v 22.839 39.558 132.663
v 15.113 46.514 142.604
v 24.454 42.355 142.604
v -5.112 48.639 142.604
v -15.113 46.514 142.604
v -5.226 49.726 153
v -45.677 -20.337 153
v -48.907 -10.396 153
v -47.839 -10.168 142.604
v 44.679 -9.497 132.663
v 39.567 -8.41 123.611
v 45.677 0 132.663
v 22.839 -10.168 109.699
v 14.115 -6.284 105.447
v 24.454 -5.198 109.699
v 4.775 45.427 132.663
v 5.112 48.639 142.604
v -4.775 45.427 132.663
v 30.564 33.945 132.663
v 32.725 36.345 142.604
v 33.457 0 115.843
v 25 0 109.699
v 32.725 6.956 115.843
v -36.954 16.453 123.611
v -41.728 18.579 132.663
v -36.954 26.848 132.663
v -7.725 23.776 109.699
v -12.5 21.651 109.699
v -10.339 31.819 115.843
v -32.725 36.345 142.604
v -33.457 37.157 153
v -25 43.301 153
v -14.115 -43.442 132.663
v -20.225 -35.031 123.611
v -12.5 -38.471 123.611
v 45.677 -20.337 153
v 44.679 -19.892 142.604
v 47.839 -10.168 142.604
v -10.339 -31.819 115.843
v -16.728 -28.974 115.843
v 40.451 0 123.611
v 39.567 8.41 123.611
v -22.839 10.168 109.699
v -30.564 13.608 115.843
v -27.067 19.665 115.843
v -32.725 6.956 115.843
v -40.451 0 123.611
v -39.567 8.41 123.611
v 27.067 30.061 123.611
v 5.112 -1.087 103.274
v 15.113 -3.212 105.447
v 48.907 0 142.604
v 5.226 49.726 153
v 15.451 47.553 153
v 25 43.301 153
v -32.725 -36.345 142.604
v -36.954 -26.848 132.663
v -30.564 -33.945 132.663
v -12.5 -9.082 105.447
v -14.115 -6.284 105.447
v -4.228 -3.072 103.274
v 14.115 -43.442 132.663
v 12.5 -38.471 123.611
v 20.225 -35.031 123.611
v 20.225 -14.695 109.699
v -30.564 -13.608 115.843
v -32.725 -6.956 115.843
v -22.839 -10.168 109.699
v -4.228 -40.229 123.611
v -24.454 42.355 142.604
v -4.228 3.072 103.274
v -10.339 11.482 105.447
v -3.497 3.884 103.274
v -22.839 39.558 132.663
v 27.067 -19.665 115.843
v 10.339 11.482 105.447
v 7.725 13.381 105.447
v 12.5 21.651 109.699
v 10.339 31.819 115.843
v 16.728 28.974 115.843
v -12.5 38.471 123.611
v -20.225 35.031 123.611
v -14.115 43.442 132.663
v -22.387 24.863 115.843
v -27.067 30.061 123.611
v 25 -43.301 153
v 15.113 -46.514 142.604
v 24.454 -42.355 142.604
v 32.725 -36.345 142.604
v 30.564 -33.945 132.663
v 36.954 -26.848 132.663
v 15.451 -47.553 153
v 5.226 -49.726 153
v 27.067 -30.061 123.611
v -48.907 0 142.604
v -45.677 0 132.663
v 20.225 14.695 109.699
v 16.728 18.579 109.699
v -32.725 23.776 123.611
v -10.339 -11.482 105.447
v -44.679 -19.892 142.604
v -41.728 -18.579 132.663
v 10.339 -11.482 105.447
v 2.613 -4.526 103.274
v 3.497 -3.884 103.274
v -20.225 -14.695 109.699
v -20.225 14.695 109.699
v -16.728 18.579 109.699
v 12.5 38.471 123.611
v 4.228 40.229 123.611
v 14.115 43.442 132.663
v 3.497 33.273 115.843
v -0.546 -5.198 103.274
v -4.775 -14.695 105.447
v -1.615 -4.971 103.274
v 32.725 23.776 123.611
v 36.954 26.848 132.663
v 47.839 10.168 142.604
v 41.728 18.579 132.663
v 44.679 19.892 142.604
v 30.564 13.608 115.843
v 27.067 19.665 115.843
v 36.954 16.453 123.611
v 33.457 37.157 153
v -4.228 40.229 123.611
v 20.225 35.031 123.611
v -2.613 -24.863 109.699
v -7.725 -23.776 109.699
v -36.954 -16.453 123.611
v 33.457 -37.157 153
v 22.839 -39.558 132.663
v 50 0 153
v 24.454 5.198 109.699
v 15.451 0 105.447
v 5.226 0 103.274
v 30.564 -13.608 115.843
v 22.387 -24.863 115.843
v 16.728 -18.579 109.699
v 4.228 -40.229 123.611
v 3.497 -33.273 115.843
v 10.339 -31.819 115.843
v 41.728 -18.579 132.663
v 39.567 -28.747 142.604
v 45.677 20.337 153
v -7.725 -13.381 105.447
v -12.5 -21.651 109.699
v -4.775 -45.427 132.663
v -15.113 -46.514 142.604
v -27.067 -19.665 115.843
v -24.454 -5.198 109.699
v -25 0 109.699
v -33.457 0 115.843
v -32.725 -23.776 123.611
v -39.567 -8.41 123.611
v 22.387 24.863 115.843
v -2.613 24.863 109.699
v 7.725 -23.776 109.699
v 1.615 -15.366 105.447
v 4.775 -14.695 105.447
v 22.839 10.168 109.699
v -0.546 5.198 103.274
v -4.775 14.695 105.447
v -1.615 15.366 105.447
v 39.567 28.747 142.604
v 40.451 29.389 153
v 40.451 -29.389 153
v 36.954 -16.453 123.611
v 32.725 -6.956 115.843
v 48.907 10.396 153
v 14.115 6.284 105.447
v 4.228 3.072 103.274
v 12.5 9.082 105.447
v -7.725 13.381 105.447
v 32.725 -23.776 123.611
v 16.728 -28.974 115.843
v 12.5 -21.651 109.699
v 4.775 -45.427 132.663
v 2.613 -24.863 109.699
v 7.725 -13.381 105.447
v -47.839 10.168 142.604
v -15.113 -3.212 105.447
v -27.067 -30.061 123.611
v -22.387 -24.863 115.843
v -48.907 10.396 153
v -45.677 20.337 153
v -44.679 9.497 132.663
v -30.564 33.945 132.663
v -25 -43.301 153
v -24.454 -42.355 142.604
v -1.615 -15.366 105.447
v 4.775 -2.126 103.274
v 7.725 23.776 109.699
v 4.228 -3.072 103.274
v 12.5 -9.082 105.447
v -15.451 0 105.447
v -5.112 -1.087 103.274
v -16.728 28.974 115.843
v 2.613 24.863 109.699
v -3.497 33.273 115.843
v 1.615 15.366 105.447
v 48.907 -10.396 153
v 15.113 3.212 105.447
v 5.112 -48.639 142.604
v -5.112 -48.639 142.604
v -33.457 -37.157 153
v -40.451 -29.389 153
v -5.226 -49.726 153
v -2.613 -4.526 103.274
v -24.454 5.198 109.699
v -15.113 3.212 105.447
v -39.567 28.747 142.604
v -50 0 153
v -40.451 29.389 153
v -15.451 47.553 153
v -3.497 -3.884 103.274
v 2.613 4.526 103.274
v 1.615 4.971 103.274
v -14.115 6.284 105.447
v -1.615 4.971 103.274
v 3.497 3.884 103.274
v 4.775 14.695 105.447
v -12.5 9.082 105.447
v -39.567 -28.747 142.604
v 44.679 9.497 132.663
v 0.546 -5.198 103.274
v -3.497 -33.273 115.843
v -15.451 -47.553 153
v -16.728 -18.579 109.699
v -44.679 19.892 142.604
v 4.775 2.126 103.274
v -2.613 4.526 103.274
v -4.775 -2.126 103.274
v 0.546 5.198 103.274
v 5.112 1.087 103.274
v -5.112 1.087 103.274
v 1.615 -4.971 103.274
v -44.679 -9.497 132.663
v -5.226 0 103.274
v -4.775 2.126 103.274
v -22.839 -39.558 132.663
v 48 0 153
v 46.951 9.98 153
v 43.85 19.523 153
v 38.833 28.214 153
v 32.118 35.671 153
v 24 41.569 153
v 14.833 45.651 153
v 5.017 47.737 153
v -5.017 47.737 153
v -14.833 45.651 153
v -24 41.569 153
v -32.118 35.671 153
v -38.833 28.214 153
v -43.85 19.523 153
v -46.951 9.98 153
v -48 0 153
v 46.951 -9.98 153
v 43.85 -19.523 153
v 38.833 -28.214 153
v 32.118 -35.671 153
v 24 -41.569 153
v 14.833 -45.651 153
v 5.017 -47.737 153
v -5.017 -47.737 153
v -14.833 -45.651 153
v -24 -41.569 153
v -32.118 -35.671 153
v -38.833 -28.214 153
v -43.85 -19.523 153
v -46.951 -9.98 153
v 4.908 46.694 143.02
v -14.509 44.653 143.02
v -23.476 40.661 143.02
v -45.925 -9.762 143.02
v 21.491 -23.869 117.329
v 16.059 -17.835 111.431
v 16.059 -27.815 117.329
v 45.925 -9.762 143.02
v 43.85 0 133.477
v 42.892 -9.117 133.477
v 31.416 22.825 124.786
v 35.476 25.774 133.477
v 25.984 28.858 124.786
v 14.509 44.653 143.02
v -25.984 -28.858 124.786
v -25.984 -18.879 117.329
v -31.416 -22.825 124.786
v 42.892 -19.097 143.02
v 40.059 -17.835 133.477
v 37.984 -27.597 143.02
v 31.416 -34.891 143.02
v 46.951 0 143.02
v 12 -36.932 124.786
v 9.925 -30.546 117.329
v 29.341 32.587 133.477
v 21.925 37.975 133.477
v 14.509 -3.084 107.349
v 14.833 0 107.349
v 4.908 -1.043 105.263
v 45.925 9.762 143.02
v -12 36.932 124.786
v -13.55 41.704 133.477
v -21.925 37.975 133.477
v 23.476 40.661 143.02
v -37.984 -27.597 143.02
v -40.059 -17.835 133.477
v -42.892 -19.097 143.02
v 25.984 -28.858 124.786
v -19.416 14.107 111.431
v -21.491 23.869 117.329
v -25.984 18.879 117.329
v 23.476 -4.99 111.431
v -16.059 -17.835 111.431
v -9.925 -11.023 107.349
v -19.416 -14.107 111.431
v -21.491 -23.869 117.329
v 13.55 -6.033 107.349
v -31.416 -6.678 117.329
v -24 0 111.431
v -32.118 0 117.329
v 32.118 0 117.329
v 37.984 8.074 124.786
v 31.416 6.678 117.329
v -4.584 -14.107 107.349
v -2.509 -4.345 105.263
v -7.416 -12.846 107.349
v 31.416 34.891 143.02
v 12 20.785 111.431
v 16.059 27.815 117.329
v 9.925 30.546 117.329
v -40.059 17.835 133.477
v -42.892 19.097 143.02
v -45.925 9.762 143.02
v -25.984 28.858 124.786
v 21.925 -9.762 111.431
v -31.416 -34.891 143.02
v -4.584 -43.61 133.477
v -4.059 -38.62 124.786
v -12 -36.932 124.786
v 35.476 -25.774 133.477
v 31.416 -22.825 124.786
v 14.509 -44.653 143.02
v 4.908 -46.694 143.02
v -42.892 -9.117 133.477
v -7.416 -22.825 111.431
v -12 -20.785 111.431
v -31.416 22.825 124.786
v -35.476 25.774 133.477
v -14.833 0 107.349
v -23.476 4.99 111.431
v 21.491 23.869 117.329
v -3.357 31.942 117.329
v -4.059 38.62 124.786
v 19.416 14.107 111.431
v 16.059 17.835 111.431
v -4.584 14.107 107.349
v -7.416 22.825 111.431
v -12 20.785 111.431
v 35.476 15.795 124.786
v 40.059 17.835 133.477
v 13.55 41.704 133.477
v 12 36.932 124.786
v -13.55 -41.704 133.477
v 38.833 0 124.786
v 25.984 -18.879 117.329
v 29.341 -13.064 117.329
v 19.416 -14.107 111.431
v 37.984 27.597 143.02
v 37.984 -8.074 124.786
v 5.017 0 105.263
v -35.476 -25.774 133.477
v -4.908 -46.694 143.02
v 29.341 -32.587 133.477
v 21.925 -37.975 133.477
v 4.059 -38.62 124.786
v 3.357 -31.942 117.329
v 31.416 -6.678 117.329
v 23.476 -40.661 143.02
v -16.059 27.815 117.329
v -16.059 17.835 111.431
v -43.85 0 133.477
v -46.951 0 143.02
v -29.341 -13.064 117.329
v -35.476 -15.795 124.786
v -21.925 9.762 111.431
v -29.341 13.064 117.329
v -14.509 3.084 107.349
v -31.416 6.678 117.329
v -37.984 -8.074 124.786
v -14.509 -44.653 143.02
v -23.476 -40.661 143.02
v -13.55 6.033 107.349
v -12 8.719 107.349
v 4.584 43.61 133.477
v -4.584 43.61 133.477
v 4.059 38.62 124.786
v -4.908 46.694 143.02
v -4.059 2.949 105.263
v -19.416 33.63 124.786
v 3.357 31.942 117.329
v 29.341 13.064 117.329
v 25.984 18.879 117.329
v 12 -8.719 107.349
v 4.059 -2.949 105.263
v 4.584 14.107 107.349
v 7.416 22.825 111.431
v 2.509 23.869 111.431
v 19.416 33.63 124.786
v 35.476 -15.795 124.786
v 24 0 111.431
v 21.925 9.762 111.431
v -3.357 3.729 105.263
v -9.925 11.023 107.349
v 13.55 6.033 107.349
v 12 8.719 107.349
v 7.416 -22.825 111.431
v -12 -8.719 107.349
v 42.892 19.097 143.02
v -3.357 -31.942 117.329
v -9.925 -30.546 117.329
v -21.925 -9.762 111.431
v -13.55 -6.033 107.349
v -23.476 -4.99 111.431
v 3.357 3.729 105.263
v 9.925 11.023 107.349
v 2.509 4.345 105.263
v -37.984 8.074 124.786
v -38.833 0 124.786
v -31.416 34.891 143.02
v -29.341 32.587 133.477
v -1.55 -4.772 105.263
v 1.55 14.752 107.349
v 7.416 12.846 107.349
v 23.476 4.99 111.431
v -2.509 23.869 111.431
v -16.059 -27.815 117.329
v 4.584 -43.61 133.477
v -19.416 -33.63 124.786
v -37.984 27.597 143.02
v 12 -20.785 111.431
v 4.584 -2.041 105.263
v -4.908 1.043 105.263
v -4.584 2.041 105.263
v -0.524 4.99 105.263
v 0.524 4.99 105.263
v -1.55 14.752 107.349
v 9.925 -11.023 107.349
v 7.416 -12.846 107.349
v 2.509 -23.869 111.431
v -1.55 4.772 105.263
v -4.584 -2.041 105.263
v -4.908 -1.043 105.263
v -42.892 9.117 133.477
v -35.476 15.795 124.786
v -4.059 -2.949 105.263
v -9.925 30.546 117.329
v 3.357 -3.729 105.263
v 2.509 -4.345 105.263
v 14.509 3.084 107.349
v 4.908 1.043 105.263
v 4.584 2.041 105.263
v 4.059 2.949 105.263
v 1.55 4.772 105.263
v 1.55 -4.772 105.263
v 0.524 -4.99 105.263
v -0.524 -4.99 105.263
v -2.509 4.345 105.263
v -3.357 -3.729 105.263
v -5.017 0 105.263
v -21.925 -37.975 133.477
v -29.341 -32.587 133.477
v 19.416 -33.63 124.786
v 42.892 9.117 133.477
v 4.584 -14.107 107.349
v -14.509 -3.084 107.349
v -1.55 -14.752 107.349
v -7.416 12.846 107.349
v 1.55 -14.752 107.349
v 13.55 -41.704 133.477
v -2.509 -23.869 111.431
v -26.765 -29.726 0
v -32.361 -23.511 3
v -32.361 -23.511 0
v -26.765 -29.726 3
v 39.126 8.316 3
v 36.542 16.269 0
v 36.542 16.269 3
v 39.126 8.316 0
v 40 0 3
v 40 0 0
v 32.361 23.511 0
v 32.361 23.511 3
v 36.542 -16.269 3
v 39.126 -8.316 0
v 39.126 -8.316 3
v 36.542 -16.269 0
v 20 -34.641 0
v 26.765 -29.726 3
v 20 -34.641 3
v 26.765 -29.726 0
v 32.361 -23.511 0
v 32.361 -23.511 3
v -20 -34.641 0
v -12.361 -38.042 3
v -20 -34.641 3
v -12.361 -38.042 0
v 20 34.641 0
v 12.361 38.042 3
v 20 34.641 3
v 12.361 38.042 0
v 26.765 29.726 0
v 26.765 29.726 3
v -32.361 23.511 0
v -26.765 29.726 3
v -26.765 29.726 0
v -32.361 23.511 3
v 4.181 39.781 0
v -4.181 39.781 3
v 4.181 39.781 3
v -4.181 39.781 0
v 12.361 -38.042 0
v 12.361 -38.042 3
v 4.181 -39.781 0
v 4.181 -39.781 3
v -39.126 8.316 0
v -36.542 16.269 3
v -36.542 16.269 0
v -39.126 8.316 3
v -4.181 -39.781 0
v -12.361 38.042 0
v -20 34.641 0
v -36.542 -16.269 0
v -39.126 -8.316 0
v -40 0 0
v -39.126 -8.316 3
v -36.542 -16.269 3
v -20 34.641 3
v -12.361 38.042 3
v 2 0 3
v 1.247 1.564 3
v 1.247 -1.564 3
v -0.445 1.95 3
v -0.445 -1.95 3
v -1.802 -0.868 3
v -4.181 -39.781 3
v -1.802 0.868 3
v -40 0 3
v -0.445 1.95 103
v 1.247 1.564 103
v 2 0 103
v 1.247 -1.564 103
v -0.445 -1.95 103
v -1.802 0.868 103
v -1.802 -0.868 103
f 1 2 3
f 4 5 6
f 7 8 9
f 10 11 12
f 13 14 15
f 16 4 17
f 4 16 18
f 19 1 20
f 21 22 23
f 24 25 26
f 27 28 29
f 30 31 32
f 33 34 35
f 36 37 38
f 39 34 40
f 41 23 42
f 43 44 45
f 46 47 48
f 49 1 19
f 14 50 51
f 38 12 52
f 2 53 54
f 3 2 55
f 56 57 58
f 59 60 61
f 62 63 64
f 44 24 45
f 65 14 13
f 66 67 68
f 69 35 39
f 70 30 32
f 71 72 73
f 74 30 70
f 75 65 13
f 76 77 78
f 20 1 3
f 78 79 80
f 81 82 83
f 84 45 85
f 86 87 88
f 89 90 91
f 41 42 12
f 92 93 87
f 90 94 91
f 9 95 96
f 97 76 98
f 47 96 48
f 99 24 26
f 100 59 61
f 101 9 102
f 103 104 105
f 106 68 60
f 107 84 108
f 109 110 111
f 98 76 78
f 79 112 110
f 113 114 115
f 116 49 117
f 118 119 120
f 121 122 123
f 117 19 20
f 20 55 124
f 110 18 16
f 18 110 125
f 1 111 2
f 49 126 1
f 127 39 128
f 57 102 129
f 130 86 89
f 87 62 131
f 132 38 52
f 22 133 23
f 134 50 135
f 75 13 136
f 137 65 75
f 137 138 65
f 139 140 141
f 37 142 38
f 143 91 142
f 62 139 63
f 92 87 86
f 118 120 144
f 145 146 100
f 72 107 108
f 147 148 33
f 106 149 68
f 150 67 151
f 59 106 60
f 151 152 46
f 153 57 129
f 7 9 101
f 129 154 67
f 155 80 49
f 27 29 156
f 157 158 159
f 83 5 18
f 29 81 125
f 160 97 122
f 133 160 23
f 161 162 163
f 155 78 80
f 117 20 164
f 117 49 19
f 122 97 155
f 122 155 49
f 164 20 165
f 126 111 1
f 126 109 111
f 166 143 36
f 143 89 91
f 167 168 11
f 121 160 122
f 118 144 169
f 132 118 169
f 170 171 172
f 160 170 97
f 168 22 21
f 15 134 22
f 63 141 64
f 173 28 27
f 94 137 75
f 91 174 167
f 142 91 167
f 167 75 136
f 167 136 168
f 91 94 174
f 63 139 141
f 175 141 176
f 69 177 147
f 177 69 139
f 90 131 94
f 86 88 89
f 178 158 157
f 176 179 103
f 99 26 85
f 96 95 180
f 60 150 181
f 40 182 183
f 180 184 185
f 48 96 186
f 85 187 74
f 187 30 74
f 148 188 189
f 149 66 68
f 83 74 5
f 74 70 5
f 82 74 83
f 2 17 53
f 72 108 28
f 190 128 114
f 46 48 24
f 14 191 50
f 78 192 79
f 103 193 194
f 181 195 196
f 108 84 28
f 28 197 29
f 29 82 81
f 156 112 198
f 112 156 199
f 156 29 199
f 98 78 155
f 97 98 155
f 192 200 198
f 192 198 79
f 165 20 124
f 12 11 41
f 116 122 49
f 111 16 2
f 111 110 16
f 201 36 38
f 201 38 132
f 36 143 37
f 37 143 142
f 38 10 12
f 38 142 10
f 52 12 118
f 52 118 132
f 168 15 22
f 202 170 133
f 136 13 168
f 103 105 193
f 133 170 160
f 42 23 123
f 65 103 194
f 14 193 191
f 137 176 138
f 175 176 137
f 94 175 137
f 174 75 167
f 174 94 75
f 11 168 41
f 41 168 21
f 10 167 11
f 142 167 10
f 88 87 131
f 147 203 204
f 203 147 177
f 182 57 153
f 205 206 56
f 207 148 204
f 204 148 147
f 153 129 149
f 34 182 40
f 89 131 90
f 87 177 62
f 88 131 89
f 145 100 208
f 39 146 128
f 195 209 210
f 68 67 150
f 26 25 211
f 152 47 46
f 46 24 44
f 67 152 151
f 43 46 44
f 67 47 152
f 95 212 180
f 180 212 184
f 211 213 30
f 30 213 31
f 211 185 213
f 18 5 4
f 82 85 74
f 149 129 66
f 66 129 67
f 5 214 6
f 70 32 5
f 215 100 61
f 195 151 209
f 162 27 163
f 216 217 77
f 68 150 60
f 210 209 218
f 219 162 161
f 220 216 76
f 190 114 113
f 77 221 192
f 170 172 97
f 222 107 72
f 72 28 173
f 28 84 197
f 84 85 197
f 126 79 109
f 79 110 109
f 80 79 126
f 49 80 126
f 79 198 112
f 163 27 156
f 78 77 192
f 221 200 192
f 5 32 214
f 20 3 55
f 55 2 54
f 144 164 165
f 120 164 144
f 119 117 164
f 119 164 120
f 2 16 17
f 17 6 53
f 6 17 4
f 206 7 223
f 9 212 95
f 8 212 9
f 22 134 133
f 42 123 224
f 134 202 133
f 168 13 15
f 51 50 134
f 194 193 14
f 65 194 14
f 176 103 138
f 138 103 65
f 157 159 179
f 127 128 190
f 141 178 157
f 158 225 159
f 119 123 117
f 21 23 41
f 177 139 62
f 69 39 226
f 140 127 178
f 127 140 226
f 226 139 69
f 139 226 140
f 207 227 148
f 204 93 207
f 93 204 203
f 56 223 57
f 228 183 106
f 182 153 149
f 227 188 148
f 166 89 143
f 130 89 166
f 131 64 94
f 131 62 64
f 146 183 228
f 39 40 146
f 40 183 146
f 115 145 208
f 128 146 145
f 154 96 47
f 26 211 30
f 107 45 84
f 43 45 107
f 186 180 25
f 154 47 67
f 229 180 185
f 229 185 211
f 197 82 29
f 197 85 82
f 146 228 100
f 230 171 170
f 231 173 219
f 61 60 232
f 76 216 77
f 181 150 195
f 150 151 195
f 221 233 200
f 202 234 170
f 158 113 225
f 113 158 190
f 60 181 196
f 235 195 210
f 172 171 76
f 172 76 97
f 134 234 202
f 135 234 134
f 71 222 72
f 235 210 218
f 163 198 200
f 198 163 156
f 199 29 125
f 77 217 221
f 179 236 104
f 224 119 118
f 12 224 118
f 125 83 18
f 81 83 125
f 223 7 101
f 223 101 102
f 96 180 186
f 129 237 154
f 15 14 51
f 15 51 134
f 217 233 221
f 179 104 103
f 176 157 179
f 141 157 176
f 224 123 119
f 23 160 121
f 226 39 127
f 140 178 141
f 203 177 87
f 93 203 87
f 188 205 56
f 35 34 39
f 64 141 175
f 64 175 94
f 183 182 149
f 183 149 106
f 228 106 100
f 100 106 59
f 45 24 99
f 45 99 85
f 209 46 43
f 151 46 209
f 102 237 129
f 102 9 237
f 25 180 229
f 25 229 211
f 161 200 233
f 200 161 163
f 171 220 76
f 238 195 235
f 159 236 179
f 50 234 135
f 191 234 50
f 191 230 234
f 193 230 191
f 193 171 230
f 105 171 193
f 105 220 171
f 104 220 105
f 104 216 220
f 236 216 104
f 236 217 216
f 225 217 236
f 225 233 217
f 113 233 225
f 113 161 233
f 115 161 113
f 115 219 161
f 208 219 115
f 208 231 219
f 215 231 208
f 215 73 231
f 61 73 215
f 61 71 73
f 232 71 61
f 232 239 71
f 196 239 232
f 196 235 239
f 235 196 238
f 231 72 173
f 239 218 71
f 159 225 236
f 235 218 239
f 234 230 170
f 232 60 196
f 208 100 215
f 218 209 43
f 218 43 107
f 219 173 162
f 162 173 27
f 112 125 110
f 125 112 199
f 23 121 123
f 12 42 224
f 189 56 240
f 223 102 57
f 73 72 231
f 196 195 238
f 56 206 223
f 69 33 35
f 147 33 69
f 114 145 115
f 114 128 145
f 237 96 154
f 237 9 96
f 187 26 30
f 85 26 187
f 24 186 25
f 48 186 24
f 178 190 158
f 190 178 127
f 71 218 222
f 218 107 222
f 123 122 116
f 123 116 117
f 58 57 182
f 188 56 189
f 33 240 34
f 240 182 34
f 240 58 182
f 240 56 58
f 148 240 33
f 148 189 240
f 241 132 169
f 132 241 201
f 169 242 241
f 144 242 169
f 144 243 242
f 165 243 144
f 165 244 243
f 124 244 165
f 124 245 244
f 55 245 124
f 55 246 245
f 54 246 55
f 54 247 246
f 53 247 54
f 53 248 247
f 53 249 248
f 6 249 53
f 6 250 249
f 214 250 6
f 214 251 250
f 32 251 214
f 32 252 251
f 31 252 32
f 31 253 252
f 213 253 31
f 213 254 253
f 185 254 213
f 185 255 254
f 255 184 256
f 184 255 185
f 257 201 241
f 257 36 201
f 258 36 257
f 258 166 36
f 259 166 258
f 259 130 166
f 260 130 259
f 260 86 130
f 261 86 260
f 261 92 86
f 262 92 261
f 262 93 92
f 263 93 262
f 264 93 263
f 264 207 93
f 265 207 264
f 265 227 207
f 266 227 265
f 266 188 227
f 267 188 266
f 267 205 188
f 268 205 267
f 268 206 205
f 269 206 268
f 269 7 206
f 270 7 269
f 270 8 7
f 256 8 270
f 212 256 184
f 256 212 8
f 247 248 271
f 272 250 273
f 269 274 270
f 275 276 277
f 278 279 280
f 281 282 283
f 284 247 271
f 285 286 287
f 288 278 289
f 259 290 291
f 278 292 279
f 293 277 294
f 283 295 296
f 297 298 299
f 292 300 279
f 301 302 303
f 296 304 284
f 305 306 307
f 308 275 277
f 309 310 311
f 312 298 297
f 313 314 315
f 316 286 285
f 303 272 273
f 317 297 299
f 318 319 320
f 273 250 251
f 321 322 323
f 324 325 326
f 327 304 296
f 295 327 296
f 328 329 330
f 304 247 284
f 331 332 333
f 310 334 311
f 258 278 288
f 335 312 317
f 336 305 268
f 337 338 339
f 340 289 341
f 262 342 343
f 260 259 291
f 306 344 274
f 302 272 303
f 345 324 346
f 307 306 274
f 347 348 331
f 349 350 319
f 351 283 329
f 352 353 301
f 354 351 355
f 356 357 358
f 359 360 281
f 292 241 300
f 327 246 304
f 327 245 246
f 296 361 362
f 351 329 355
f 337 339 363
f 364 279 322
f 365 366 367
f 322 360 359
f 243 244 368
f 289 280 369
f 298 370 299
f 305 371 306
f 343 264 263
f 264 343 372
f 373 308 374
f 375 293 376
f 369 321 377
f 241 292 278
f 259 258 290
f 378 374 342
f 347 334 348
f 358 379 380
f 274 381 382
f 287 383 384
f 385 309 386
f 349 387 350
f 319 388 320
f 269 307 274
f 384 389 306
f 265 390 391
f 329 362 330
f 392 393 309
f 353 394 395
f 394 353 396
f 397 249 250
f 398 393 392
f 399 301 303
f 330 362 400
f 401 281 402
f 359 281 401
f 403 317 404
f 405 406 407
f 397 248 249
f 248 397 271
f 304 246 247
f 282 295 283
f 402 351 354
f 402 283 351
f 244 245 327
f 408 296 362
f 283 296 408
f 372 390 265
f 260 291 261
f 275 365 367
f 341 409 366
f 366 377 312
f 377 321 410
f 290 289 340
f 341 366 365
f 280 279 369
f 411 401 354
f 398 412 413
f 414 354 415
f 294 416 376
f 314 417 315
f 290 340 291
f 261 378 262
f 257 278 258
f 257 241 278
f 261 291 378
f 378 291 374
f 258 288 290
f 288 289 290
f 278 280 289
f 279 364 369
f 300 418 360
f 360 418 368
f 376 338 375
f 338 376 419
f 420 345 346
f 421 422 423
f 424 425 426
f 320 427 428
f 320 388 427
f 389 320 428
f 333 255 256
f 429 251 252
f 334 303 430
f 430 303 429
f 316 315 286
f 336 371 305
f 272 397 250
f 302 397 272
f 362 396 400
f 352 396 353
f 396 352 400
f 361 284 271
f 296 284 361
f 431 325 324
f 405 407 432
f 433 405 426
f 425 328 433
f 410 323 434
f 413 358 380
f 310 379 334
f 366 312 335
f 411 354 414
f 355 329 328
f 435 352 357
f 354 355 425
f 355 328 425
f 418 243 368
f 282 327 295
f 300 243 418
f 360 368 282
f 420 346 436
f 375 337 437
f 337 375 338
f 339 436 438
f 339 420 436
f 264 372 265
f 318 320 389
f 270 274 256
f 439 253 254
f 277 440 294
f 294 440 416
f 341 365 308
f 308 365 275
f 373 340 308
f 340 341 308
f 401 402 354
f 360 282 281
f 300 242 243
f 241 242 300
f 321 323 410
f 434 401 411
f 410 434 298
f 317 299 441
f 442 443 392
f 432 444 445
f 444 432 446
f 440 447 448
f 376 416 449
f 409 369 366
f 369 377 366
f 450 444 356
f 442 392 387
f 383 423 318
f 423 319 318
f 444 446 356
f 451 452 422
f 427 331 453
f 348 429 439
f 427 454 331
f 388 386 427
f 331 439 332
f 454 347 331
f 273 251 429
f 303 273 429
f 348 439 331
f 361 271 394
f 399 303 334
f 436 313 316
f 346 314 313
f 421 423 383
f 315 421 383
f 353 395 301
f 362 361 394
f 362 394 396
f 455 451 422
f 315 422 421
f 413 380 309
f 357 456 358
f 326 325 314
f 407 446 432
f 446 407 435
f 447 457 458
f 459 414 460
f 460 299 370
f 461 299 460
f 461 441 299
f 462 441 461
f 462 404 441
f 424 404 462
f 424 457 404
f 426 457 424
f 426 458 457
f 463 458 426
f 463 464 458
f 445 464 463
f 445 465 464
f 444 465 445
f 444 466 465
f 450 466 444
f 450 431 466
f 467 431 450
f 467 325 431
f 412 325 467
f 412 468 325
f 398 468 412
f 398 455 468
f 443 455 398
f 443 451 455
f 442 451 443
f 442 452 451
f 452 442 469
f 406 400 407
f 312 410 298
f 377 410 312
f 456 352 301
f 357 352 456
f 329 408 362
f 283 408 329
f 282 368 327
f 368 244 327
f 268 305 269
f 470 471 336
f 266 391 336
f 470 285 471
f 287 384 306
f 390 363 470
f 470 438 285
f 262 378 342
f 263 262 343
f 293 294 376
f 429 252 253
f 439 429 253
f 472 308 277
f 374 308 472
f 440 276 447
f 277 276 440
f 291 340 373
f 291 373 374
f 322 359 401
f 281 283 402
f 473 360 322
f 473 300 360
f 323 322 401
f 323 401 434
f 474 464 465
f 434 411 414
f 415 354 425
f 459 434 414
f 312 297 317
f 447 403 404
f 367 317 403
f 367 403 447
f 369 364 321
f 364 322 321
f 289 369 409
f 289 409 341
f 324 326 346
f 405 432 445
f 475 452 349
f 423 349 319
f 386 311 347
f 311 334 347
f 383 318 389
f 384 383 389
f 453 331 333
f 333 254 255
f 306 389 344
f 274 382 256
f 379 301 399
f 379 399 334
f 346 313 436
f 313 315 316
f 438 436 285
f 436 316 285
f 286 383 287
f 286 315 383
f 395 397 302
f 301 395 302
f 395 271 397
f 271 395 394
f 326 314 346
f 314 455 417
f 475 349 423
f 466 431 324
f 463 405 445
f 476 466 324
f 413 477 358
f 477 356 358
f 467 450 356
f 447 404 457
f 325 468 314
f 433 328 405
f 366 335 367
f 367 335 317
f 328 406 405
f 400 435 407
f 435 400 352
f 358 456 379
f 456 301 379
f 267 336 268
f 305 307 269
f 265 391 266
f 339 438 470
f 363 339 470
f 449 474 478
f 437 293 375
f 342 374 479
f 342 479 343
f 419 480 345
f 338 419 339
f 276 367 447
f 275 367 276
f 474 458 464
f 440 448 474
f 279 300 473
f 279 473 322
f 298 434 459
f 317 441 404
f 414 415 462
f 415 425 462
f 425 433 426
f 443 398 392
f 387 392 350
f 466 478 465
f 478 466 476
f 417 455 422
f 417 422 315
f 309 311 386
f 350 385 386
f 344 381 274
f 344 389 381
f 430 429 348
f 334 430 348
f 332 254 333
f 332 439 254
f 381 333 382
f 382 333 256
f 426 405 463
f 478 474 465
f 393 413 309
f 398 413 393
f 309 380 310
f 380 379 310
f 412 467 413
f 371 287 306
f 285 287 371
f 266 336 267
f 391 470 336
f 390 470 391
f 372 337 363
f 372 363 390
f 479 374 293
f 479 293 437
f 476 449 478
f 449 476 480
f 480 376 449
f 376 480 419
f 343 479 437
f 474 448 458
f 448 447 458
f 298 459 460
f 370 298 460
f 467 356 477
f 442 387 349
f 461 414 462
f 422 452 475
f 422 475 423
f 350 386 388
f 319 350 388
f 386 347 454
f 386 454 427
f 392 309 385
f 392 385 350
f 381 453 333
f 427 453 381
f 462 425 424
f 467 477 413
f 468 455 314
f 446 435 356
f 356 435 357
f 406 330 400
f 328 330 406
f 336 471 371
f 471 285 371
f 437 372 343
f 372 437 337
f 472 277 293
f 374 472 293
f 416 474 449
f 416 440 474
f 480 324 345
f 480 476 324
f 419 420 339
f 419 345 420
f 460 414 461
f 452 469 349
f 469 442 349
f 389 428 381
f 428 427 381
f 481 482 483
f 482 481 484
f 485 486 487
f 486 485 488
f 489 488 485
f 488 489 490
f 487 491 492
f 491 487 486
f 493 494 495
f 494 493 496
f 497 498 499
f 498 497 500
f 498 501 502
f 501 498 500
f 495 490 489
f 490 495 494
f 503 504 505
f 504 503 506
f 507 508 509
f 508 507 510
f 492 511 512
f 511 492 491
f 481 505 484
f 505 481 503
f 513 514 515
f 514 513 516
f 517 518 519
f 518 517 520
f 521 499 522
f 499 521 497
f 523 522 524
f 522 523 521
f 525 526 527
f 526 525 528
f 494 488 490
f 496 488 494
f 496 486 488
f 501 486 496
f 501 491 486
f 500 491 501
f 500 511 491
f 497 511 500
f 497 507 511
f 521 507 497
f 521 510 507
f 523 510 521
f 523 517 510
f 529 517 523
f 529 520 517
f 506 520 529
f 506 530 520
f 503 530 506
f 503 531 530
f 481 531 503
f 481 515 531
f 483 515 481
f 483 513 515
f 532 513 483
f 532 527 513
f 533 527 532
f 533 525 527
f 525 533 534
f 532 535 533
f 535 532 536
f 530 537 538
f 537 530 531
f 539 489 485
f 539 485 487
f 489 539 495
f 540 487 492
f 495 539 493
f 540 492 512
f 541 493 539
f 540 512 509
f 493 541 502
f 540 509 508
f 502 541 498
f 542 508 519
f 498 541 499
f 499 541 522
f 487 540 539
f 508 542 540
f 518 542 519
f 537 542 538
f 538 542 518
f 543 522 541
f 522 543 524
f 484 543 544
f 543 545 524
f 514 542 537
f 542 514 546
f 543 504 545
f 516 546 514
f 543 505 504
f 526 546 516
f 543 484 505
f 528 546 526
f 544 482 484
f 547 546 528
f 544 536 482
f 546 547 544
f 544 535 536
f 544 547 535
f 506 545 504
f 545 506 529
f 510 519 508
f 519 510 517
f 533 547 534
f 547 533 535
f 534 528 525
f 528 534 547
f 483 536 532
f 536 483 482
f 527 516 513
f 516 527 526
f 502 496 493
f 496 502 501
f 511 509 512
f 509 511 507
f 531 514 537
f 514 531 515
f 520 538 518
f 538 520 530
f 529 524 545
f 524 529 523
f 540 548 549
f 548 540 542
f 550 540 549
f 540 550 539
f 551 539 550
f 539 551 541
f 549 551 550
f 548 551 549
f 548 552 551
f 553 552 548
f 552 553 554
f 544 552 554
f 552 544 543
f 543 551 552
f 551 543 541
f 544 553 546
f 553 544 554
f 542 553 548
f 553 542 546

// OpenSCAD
module pahar_sampanie(raza_baza,grosime_baza,raza_picior,inaltime_picior,raza_cupa, grosime_perete_cupa)
{
    baza_pahar(raza_baza,grosime_baza);
    translate([0,0,grosime_baza]) picior_pahar(raza_picior,inaltime_picior);
    translate([0,0,grosime_baza+inaltime_picior+raza_cupa]) cupa(raza_cupa, grosime_perete_cupa);
}//end pahar_sampanie

//------------------------------

module baza_pahar(raza_baza,grosime_baza)
{
    cylinder(h=grosime_baza,r=raza_baza);
}//end baza_pahar

//------------------------------

module picior_pahar(raza_picior,inaltime_picior)
{
    cylinder(h=inaltime_picior,r=raza_picior);
}//end picior_pahar

//------------------------------

module cupa(raza_cupa, grosime_perete_cupa)
{ 
    difference(){
    sphere(r=raza_cupa);
    translate([-raza_cupa,-raza_cupa]) cube([2*raza_cupa,2*raza_cupa,raza_cupa]);
    sphere(r=raza_cupa-grosime_perete_cupa);
    }
}//end cupa
//------------------------------

pahar_sampanie(raza_baza=40,grosime_baza=3,raza_picior=2,inaltime_picior=100,raza_cupa=50, grosime_perete_cupa=2);
